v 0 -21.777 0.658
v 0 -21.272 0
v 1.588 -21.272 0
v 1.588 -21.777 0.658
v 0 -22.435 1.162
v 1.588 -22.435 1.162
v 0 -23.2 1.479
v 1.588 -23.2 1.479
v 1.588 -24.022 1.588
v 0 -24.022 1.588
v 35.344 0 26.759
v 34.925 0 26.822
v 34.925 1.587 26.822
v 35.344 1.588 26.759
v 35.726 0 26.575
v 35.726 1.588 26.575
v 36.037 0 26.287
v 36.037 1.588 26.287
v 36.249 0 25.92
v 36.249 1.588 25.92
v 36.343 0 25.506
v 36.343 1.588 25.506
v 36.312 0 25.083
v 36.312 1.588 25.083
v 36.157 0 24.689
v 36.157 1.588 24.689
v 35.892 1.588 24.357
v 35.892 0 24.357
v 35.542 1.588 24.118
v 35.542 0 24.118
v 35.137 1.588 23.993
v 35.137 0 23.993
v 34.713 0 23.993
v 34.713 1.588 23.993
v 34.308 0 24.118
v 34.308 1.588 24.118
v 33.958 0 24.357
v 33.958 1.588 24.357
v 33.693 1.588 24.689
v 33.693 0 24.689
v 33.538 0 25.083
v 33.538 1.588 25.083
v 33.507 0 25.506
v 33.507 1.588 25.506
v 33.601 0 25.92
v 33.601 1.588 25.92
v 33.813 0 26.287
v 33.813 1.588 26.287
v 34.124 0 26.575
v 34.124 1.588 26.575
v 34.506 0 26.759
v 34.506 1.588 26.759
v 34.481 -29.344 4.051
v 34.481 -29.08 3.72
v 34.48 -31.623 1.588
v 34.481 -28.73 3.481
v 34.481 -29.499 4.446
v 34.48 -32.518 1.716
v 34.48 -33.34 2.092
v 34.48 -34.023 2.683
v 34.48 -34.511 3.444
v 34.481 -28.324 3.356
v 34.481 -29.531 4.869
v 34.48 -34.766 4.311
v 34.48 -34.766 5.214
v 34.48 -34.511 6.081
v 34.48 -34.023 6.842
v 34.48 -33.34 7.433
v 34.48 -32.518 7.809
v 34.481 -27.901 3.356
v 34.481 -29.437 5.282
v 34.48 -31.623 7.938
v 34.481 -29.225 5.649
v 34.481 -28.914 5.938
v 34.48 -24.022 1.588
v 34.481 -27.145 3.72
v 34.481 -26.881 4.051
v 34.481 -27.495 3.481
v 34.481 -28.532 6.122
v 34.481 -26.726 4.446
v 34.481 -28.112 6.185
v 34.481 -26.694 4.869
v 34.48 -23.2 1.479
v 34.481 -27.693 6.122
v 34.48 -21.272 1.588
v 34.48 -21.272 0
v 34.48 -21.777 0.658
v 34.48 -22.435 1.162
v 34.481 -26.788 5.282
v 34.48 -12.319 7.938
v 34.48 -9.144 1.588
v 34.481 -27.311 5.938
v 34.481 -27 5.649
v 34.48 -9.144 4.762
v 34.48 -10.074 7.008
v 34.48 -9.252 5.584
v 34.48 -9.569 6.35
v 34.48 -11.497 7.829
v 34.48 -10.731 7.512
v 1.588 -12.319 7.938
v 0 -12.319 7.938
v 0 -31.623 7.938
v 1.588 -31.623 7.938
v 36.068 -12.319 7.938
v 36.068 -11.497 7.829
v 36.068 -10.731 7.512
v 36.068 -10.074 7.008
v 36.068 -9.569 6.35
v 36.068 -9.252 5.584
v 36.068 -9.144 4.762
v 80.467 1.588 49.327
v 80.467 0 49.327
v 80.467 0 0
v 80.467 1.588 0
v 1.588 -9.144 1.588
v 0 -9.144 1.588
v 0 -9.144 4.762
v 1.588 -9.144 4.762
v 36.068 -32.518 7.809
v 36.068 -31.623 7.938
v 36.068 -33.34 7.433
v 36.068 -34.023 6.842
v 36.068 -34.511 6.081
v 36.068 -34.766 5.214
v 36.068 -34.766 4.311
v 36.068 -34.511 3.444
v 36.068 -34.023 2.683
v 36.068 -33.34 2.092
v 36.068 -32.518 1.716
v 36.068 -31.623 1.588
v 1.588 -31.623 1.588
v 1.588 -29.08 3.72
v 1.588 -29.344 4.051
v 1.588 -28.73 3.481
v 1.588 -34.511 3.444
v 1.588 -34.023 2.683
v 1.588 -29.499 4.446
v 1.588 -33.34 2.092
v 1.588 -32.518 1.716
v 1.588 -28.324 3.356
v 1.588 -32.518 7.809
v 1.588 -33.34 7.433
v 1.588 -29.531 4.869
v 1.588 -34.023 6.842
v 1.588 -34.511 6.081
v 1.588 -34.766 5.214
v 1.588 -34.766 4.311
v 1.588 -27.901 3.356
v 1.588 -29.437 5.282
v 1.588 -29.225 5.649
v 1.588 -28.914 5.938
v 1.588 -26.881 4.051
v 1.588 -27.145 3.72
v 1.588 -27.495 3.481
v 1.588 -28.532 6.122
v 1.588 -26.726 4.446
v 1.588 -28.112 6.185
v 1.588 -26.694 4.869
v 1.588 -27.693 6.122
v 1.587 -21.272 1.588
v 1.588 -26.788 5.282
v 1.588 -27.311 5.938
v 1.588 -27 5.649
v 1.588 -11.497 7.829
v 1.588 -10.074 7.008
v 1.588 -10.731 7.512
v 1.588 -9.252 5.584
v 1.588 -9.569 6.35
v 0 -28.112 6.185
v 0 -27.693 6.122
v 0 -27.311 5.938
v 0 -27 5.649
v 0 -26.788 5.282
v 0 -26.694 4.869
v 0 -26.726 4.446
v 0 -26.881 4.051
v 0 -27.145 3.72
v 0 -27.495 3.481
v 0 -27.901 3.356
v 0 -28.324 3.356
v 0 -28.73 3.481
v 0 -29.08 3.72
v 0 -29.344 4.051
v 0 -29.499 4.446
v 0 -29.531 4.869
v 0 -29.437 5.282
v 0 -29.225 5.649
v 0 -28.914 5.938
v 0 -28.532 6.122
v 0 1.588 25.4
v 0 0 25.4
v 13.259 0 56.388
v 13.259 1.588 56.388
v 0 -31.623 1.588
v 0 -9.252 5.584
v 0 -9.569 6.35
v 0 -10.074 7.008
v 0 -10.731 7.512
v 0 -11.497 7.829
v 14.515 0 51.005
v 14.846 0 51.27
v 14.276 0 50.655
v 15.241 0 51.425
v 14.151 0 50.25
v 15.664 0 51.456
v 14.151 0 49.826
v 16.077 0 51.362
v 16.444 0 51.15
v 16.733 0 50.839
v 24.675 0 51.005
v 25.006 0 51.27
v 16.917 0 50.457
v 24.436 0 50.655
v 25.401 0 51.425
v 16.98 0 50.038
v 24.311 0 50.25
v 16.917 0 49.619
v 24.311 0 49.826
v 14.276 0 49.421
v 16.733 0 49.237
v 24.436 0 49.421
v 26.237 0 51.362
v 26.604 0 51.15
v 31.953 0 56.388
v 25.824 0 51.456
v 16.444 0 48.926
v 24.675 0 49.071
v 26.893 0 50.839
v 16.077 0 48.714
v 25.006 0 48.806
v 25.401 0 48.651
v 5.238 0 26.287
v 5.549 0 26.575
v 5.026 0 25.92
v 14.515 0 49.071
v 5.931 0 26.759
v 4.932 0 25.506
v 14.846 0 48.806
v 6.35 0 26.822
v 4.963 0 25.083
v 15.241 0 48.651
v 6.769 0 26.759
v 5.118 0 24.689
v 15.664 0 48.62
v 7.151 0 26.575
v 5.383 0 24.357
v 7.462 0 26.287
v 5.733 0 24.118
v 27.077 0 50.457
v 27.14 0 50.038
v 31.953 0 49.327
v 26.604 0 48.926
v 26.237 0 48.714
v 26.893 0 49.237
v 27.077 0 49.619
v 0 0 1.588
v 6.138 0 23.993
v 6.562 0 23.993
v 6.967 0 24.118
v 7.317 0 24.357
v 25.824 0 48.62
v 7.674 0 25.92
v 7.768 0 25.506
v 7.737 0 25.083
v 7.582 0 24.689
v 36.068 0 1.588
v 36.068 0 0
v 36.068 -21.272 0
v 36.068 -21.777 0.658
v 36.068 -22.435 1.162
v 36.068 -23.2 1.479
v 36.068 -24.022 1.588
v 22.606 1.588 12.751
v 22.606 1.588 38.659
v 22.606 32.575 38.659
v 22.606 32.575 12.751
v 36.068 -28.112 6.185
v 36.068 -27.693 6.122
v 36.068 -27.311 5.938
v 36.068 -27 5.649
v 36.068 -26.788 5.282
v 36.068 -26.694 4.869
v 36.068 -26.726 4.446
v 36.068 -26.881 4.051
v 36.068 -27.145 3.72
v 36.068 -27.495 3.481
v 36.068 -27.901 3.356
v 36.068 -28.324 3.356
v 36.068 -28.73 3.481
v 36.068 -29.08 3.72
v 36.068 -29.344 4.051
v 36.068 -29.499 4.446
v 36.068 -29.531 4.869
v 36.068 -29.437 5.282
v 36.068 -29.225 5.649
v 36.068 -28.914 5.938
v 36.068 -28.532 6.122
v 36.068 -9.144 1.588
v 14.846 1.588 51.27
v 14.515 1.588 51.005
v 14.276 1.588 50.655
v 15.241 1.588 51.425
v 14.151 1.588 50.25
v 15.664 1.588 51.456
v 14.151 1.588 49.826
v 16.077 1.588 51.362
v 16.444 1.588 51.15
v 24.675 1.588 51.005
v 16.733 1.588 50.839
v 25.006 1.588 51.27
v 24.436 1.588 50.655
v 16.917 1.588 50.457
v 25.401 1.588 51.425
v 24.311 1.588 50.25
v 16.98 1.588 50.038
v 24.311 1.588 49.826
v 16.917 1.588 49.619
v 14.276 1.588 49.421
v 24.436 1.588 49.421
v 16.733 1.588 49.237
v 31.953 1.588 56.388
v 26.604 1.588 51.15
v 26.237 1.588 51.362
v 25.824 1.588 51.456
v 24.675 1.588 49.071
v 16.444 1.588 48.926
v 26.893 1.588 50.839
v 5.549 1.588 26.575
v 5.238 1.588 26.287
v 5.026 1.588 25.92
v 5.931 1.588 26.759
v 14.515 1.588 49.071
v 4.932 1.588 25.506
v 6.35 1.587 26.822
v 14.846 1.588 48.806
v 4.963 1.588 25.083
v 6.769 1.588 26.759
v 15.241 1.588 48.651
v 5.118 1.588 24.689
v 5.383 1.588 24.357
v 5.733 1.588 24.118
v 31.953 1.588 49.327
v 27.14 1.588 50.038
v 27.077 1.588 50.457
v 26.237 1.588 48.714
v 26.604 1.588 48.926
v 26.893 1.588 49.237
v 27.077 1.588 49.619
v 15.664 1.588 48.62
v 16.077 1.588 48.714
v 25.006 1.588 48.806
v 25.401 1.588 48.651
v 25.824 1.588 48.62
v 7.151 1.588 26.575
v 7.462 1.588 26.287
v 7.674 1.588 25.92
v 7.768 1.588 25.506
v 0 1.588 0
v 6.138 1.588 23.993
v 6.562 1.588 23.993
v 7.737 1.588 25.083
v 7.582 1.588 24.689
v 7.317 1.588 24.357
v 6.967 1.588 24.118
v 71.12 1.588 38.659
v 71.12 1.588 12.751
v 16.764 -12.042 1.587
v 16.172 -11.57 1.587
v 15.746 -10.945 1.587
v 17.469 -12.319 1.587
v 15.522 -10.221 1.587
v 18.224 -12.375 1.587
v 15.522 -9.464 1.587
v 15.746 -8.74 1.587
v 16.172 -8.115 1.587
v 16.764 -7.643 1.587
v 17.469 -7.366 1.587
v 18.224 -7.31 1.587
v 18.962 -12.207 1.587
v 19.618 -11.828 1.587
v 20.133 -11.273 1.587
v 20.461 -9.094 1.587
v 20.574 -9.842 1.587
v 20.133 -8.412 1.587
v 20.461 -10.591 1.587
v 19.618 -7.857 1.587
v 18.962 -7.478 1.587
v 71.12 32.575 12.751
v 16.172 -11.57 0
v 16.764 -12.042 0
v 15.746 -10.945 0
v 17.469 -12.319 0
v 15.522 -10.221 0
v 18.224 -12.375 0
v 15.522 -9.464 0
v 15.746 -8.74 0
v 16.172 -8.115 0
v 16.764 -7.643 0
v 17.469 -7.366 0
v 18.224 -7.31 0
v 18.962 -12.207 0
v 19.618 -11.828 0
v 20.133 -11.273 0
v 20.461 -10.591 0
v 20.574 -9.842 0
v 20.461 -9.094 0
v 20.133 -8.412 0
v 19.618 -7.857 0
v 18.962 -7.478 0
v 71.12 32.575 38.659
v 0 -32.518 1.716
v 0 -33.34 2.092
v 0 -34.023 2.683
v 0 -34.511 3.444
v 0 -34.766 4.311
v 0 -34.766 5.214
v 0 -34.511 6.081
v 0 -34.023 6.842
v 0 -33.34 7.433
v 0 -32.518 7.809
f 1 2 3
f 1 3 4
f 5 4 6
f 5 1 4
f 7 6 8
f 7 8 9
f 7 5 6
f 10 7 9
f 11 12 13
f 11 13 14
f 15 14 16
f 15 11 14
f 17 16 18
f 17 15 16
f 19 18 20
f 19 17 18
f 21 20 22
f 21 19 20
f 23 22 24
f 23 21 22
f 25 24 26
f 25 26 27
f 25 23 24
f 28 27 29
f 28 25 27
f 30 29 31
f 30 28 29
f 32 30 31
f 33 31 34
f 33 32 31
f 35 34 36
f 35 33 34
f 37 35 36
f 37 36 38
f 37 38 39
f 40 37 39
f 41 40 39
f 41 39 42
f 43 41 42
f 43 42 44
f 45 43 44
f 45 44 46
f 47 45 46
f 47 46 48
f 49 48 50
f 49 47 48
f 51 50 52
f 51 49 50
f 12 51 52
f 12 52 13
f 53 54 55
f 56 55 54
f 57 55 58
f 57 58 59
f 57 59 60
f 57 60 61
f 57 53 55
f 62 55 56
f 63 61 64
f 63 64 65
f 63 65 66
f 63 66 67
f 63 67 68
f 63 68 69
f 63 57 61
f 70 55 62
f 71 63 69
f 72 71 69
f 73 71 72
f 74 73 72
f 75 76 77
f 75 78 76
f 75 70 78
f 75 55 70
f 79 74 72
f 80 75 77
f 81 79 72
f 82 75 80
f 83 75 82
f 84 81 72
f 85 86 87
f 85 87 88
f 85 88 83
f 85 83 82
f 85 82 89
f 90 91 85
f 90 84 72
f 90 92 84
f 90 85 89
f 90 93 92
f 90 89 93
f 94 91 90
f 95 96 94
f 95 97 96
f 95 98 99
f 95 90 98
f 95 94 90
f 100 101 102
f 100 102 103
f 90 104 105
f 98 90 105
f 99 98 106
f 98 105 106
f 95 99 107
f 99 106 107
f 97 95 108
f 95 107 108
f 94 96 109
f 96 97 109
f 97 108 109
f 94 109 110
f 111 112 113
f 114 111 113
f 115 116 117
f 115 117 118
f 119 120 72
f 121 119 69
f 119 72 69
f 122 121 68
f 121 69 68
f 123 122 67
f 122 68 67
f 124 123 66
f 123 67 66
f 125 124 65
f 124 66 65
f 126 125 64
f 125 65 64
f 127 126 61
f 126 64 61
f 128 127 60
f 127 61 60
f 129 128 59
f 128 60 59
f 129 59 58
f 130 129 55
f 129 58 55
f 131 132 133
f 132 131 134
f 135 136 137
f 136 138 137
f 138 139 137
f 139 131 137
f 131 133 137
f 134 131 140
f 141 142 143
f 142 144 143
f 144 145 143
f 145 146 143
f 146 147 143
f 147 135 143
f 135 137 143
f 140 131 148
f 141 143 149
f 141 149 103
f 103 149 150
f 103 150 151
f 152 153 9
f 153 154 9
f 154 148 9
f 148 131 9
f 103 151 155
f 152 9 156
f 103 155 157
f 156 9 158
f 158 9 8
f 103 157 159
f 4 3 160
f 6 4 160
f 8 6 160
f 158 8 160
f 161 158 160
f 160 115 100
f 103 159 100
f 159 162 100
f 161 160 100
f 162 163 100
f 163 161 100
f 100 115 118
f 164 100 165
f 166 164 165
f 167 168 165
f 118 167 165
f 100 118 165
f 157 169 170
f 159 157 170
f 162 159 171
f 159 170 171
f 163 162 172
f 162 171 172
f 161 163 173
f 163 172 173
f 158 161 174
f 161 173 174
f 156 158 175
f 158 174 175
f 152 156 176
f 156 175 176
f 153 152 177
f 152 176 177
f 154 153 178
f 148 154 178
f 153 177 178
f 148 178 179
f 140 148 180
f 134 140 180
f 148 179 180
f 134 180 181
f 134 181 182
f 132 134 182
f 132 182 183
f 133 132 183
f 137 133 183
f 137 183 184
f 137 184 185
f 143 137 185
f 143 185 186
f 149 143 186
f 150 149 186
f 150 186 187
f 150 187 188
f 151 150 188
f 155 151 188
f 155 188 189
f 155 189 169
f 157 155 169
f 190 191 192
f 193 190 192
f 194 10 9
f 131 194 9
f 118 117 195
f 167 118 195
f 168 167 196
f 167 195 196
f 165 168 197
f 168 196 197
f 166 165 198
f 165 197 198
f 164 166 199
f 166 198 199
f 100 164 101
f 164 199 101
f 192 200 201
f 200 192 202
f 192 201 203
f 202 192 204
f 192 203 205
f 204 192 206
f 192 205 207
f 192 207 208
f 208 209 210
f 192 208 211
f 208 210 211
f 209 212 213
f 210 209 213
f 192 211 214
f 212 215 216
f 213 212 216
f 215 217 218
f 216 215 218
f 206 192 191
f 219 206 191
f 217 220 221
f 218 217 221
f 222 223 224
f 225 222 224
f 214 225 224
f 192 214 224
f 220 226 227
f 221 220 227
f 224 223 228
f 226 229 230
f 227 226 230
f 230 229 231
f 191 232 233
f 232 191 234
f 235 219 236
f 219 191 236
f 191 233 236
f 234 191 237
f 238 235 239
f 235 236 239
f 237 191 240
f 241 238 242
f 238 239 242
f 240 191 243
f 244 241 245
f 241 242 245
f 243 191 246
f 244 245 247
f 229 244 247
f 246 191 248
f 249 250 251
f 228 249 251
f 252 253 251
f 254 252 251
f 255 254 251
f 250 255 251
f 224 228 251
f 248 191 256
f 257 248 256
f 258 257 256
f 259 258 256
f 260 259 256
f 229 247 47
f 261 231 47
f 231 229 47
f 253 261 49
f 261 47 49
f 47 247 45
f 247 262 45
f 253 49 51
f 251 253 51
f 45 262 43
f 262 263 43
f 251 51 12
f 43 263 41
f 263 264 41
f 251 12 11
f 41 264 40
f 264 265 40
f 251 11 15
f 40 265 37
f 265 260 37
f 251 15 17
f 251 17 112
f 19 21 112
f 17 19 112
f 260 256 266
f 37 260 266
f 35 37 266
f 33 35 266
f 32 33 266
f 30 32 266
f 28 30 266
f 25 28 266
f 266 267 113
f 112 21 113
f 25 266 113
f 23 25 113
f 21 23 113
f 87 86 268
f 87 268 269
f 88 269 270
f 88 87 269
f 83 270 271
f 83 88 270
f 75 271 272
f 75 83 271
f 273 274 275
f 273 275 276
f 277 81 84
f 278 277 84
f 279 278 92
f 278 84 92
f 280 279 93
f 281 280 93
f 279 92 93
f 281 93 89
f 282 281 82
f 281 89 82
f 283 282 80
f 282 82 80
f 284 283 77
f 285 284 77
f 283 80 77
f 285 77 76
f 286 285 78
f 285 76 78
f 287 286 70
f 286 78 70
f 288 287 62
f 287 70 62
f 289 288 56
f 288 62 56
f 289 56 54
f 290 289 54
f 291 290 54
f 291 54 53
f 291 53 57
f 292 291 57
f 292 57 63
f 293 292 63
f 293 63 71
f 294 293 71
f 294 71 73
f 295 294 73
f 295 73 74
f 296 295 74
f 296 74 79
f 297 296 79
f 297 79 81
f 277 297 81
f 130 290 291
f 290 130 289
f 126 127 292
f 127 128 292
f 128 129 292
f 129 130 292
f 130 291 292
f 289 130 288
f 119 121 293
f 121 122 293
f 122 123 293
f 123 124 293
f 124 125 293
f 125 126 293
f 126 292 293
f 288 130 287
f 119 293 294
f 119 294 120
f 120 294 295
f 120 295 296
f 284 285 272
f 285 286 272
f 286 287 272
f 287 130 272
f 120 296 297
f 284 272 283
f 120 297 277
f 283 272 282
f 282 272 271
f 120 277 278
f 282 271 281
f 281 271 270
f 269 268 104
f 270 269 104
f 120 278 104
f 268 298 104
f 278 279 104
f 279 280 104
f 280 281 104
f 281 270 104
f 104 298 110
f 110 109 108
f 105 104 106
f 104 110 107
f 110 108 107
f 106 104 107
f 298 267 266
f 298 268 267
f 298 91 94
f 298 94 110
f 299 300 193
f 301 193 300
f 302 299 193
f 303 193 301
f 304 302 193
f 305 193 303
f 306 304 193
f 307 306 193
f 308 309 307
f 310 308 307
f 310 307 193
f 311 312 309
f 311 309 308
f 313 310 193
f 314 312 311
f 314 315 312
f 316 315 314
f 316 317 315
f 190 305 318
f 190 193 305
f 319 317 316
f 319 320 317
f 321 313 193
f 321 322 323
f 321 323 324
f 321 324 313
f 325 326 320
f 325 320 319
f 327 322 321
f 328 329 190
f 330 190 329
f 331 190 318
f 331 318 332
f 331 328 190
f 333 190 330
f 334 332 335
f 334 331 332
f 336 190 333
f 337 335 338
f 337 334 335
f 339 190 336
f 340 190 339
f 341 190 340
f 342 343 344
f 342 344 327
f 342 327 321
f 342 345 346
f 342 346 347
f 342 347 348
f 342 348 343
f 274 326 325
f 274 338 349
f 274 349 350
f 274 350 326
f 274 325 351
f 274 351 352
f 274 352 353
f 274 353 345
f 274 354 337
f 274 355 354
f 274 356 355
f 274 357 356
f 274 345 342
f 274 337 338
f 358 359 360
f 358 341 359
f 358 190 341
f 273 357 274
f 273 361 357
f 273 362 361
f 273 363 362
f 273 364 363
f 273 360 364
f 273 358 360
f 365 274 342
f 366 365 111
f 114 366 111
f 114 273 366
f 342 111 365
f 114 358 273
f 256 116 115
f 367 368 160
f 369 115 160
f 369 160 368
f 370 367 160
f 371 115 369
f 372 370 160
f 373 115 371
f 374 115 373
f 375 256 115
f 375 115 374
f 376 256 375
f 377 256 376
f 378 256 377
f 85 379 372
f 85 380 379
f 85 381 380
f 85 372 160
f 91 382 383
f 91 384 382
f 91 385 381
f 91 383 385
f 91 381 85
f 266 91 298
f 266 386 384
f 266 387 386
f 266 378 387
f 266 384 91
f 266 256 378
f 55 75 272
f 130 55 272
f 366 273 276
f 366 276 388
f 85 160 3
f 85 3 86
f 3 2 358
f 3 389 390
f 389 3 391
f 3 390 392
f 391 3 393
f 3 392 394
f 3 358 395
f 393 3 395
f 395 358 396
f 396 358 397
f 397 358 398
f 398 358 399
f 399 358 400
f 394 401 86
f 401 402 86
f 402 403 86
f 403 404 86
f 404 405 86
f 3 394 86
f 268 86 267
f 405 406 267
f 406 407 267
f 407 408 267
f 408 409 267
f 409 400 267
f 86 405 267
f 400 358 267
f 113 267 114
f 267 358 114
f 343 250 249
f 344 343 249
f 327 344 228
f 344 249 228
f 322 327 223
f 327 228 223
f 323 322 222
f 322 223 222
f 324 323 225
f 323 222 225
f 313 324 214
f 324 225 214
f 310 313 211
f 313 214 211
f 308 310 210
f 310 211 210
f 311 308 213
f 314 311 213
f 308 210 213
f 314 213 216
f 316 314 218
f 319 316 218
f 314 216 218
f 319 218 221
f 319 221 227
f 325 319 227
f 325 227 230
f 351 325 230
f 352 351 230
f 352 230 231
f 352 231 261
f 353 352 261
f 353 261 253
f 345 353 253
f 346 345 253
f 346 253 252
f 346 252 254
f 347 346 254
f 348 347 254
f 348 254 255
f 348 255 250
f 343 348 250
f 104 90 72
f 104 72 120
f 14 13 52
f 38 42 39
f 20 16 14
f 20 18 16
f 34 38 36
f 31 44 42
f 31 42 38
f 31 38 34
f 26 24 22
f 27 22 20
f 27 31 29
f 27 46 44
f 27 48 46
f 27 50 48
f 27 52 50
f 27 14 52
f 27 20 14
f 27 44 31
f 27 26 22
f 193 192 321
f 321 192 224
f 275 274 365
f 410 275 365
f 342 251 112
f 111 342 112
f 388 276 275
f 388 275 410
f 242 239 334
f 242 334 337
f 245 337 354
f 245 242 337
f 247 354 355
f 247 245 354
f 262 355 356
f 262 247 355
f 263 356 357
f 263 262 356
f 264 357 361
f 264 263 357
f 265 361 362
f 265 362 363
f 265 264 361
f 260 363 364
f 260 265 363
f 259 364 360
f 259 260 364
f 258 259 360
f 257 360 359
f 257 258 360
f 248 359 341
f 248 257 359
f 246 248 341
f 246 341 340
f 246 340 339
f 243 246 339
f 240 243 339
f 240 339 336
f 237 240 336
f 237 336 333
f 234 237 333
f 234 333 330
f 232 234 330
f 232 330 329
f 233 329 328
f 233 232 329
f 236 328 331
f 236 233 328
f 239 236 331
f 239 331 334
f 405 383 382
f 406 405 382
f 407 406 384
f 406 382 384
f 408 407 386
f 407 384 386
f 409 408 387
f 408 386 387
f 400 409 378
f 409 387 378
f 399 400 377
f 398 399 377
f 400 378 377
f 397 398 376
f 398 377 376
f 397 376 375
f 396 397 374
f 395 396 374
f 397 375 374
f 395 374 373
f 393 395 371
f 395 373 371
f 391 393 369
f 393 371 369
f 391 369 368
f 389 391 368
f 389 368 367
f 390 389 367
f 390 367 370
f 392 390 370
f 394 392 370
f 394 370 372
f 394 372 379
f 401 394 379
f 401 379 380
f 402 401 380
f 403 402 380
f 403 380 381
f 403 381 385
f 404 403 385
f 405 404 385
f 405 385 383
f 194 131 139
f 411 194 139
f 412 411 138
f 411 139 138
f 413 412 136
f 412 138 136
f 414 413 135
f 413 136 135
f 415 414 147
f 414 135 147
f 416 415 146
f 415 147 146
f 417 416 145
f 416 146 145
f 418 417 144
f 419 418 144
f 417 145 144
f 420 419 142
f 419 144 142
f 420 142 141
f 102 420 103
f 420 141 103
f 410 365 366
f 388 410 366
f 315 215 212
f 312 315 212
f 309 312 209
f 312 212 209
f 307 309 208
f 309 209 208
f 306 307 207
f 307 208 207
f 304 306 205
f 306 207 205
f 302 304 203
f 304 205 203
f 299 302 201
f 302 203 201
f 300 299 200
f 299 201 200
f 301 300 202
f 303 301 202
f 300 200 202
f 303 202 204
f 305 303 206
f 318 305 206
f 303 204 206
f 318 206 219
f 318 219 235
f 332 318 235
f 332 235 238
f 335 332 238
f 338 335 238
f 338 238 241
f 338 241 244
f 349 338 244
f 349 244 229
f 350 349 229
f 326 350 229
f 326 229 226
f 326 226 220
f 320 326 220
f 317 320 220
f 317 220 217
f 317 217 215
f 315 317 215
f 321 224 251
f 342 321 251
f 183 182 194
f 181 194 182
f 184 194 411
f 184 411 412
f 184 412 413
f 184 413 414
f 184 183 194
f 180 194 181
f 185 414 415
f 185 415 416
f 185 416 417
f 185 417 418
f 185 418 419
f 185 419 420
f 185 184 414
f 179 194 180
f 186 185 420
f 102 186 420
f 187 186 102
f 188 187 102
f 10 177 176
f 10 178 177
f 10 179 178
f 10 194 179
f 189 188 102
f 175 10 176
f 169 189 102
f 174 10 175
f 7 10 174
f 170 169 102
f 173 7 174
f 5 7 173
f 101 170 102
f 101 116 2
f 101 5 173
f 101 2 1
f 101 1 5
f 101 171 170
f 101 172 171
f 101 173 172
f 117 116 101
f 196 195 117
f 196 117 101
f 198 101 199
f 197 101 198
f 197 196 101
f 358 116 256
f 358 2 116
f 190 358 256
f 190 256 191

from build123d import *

# Parameters (mm, degrees)
BOSS_EXTRUDE1_DEPTH = 1.5875
SKETCH2_W           = 36.068
SKETCH2_H           = 1.5875
BOSS_EXTRUDE2_DEPTH = 21.2725
SKETCH3_W           = 1.5875
SKETCH3_H           = 25.654
BOSS_EXTRUDE3_DEPTH = 6.35
FILLET1_R           = 3.175
HOLE1_D             = 5.08
HOLE1_DEPTH         = 15.875
HOLE2_D             = 2.8448
SKETCH9_W           = 48.514
SKETCH9_H           = 25.908
BOSS_EXTRUDE4_DEPTH = 30.988
HOLE3_D             = 2.8448
LPATTERN1_COUNT     = 2
LPATTERN1_PITCH     = 10.16
SKETCH12_W          = 1.4224
SKETCH12_H          = 36.3855
LPATTERN2_COUNT     = 2
LPATTERN2_PITCH     = 28.575


with BuildPart() as part:
    # Sketch1 → Boss-Extrude1 (new body)
    with BuildSketch(Plane(origin=(0, 0, 0), x_dir=(1, 0, 0), z_dir=(0, 1, 0))):
        Polygon((0, 0), (0, -25.4), (13.2588, -56.388), (31.9532, -56.388), (31.9532, -49.3268), (80.4672, -49.3268), (80.4672, 0), align=None)
    extrude(amount=BOSS_EXTRUDE1_DEPTH)

    # Sketch2 → Boss-Extrude2 (add)
    with BuildSketch(Plane.XZ):
        with Locations((18.034, 0.79375)):
            Rectangle(SKETCH2_W, SKETCH2_H)
    extrude(amount=BOSS_EXTRUDE2_DEPTH)

    # Sketch3 → Boss-Extrude3 (add)
    with BuildSketch(Plane.XY.offset(1.5875)):
        with Locations((35.27425, -21.971)):
            Rectangle(SKETCH3_W, SKETCH3_H)
        with Locations((0.79375, -21.971)):
            Rectangle(SKETCH3_W, SKETCH3_H)
    extrude(amount=BOSS_EXTRUDE3_DEPTH)

    # Fillet1
    # the kernel refuses this fillet: 3.175 mm, written as the material it adds along each edge
    with BuildSketch(Plane(origin=(34.4805, -21.2725, 1.5875), x_dir=(0, 0, -1), z_dir=(1, 0, 0)), Plane(origin=(0, -21.2725, 1.5875), x_dir=(0, 0, -1), z_dir=(1, 0, 0))) as fillet1_piece_1:
        with BuildLine():
            CenterArc((3.175, -2.749630657), FILLET1_R, 120, 60)
            Line((0, -2.749630657), (0, 0))
            Line((0, 0), (1.5875, 0))
        make_face()
    extrude(amount=1.5875)
    # the kernel refuses this fillet: 3.175 mm, written as the material it takes off along each edge
    with BuildSketch(Plane(origin=(26.543, -34.798, 1.5875), x_dir=(0, 1, 0), z_dir=(1, 0, 0)), Plane(origin=(44.0055, -9.144, 7.9375), x_dir=(0, 0, -1), z_dir=(-1, 0, 0)), Plane(origin=(9.525, -34.798, 1.5875), x_dir=(0, 0, 1), z_dir=(-1, 0, 0)), Plane(origin=(9.525, -34.798, 7.9375), x_dir=(0, 1, 0), z_dir=(-1, 0, 0))) as fillet1_2_piece_1:
        with BuildLine():
            CenterArc((FILLET1_R, FILLET1_R), FILLET1_R, 180, 90)
            Line((0, FILLET1_R), (0, 0))
            Line((0, 0), (FILLET1_R, 0))
        make_face()
    extrude(amount=17.4625, mode=Mode.SUBTRACT)
    with BuildSketch(Plane(origin=(26.543, -34.798, 7.9375), x_dir=(0, 1, 0), z_dir=(1, 0, 0)), Plane(origin=(-7.9375, -9.144, 7.9375), x_dir=(0, 0, -1), z_dir=(1, 0, 0))) as fillet1_2_piece_2:
        with BuildLine():
            CenterArc((FILLET1_R, -FILLET1_R), FILLET1_R, 90, 90)
            Line((0, -FILLET1_R), (0, 0))
            Line((0, 0), (FILLET1_R, 0))
        make_face()
    extrude(amount=17.4625, mode=Mode.SUBTRACT)

    # Hole1
    with Locations(Plane(origin=(0, 0, 0), x_dir=(-1, 0, 0), z_dir=(0, 0, -1))):
        with Locations((-18.034, -9.8425)):
            Hole(HOLE1_D / 2, depth=HOLE1_DEPTH)

    # Hole2 (through all)
    with Locations(Plane(origin=(36.068, 3.937526914, -1.455484635), x_dir=(0, 0, -1), z_dir=(1, 0, 0))):
        with Locations((-6.217984635, -32.050026914)):
            Hole(HOLE2_D / 2)

    # Sketch9 → Boss-Extrude4 (add)
    with BuildSketch(Plane(origin=(0, 1.5875, 0), x_dir=(1, 0, 0), z_dir=(0, 1, 0))):
        with Locations((46.863, -25.7048)):
            Rectangle(SKETCH9_W, SKETCH9_H)
    extrude(amount=BOSS_EXTRUDE4_DEPTH)

    # Hole3 (through all)
    with Locations(Plane(origin=(0, 1.5875, 0), x_dir=(-1, 0, 0), z_dir=(0, 1, 0))):
        with Locations((-25.7175, 50.038)):
            hole3 = Hole(HOLE3_D / 2)

    # LPattern1: Hole3 ×2
    with Locations(*[(-i * LPATTERN1_PITCH, 0, 0) for i in range(1, LPATTERN1_COUNT)]):
        add(hole3, mode=Mode.SUBTRACT)

    # Sketch12 → Hole4 (revolve, cut)
    with BuildSketch(Plane(origin=(6.35, 1.5875, 25.4), x_dir=(0, 0, 1), z_dir=(1, 0, 0))):
        with Locations((0.7112, 18.19275)):
            Rectangle(SKETCH12_W, SKETCH12_H)
    hole4 = revolve(axis=Axis((6.35, -108.4125, 25.4), (0, 1, 0)), mode=Mode.SUBTRACT)

    # LPattern2: Hole4 ×2
    with Locations(*[(i * LPATTERN2_PITCH, 0, 0) for i in range(1, LPATTERN2_COUNT)]):
        add(hole4, mode=Mode.SUBTRACT)


solid = part.part
